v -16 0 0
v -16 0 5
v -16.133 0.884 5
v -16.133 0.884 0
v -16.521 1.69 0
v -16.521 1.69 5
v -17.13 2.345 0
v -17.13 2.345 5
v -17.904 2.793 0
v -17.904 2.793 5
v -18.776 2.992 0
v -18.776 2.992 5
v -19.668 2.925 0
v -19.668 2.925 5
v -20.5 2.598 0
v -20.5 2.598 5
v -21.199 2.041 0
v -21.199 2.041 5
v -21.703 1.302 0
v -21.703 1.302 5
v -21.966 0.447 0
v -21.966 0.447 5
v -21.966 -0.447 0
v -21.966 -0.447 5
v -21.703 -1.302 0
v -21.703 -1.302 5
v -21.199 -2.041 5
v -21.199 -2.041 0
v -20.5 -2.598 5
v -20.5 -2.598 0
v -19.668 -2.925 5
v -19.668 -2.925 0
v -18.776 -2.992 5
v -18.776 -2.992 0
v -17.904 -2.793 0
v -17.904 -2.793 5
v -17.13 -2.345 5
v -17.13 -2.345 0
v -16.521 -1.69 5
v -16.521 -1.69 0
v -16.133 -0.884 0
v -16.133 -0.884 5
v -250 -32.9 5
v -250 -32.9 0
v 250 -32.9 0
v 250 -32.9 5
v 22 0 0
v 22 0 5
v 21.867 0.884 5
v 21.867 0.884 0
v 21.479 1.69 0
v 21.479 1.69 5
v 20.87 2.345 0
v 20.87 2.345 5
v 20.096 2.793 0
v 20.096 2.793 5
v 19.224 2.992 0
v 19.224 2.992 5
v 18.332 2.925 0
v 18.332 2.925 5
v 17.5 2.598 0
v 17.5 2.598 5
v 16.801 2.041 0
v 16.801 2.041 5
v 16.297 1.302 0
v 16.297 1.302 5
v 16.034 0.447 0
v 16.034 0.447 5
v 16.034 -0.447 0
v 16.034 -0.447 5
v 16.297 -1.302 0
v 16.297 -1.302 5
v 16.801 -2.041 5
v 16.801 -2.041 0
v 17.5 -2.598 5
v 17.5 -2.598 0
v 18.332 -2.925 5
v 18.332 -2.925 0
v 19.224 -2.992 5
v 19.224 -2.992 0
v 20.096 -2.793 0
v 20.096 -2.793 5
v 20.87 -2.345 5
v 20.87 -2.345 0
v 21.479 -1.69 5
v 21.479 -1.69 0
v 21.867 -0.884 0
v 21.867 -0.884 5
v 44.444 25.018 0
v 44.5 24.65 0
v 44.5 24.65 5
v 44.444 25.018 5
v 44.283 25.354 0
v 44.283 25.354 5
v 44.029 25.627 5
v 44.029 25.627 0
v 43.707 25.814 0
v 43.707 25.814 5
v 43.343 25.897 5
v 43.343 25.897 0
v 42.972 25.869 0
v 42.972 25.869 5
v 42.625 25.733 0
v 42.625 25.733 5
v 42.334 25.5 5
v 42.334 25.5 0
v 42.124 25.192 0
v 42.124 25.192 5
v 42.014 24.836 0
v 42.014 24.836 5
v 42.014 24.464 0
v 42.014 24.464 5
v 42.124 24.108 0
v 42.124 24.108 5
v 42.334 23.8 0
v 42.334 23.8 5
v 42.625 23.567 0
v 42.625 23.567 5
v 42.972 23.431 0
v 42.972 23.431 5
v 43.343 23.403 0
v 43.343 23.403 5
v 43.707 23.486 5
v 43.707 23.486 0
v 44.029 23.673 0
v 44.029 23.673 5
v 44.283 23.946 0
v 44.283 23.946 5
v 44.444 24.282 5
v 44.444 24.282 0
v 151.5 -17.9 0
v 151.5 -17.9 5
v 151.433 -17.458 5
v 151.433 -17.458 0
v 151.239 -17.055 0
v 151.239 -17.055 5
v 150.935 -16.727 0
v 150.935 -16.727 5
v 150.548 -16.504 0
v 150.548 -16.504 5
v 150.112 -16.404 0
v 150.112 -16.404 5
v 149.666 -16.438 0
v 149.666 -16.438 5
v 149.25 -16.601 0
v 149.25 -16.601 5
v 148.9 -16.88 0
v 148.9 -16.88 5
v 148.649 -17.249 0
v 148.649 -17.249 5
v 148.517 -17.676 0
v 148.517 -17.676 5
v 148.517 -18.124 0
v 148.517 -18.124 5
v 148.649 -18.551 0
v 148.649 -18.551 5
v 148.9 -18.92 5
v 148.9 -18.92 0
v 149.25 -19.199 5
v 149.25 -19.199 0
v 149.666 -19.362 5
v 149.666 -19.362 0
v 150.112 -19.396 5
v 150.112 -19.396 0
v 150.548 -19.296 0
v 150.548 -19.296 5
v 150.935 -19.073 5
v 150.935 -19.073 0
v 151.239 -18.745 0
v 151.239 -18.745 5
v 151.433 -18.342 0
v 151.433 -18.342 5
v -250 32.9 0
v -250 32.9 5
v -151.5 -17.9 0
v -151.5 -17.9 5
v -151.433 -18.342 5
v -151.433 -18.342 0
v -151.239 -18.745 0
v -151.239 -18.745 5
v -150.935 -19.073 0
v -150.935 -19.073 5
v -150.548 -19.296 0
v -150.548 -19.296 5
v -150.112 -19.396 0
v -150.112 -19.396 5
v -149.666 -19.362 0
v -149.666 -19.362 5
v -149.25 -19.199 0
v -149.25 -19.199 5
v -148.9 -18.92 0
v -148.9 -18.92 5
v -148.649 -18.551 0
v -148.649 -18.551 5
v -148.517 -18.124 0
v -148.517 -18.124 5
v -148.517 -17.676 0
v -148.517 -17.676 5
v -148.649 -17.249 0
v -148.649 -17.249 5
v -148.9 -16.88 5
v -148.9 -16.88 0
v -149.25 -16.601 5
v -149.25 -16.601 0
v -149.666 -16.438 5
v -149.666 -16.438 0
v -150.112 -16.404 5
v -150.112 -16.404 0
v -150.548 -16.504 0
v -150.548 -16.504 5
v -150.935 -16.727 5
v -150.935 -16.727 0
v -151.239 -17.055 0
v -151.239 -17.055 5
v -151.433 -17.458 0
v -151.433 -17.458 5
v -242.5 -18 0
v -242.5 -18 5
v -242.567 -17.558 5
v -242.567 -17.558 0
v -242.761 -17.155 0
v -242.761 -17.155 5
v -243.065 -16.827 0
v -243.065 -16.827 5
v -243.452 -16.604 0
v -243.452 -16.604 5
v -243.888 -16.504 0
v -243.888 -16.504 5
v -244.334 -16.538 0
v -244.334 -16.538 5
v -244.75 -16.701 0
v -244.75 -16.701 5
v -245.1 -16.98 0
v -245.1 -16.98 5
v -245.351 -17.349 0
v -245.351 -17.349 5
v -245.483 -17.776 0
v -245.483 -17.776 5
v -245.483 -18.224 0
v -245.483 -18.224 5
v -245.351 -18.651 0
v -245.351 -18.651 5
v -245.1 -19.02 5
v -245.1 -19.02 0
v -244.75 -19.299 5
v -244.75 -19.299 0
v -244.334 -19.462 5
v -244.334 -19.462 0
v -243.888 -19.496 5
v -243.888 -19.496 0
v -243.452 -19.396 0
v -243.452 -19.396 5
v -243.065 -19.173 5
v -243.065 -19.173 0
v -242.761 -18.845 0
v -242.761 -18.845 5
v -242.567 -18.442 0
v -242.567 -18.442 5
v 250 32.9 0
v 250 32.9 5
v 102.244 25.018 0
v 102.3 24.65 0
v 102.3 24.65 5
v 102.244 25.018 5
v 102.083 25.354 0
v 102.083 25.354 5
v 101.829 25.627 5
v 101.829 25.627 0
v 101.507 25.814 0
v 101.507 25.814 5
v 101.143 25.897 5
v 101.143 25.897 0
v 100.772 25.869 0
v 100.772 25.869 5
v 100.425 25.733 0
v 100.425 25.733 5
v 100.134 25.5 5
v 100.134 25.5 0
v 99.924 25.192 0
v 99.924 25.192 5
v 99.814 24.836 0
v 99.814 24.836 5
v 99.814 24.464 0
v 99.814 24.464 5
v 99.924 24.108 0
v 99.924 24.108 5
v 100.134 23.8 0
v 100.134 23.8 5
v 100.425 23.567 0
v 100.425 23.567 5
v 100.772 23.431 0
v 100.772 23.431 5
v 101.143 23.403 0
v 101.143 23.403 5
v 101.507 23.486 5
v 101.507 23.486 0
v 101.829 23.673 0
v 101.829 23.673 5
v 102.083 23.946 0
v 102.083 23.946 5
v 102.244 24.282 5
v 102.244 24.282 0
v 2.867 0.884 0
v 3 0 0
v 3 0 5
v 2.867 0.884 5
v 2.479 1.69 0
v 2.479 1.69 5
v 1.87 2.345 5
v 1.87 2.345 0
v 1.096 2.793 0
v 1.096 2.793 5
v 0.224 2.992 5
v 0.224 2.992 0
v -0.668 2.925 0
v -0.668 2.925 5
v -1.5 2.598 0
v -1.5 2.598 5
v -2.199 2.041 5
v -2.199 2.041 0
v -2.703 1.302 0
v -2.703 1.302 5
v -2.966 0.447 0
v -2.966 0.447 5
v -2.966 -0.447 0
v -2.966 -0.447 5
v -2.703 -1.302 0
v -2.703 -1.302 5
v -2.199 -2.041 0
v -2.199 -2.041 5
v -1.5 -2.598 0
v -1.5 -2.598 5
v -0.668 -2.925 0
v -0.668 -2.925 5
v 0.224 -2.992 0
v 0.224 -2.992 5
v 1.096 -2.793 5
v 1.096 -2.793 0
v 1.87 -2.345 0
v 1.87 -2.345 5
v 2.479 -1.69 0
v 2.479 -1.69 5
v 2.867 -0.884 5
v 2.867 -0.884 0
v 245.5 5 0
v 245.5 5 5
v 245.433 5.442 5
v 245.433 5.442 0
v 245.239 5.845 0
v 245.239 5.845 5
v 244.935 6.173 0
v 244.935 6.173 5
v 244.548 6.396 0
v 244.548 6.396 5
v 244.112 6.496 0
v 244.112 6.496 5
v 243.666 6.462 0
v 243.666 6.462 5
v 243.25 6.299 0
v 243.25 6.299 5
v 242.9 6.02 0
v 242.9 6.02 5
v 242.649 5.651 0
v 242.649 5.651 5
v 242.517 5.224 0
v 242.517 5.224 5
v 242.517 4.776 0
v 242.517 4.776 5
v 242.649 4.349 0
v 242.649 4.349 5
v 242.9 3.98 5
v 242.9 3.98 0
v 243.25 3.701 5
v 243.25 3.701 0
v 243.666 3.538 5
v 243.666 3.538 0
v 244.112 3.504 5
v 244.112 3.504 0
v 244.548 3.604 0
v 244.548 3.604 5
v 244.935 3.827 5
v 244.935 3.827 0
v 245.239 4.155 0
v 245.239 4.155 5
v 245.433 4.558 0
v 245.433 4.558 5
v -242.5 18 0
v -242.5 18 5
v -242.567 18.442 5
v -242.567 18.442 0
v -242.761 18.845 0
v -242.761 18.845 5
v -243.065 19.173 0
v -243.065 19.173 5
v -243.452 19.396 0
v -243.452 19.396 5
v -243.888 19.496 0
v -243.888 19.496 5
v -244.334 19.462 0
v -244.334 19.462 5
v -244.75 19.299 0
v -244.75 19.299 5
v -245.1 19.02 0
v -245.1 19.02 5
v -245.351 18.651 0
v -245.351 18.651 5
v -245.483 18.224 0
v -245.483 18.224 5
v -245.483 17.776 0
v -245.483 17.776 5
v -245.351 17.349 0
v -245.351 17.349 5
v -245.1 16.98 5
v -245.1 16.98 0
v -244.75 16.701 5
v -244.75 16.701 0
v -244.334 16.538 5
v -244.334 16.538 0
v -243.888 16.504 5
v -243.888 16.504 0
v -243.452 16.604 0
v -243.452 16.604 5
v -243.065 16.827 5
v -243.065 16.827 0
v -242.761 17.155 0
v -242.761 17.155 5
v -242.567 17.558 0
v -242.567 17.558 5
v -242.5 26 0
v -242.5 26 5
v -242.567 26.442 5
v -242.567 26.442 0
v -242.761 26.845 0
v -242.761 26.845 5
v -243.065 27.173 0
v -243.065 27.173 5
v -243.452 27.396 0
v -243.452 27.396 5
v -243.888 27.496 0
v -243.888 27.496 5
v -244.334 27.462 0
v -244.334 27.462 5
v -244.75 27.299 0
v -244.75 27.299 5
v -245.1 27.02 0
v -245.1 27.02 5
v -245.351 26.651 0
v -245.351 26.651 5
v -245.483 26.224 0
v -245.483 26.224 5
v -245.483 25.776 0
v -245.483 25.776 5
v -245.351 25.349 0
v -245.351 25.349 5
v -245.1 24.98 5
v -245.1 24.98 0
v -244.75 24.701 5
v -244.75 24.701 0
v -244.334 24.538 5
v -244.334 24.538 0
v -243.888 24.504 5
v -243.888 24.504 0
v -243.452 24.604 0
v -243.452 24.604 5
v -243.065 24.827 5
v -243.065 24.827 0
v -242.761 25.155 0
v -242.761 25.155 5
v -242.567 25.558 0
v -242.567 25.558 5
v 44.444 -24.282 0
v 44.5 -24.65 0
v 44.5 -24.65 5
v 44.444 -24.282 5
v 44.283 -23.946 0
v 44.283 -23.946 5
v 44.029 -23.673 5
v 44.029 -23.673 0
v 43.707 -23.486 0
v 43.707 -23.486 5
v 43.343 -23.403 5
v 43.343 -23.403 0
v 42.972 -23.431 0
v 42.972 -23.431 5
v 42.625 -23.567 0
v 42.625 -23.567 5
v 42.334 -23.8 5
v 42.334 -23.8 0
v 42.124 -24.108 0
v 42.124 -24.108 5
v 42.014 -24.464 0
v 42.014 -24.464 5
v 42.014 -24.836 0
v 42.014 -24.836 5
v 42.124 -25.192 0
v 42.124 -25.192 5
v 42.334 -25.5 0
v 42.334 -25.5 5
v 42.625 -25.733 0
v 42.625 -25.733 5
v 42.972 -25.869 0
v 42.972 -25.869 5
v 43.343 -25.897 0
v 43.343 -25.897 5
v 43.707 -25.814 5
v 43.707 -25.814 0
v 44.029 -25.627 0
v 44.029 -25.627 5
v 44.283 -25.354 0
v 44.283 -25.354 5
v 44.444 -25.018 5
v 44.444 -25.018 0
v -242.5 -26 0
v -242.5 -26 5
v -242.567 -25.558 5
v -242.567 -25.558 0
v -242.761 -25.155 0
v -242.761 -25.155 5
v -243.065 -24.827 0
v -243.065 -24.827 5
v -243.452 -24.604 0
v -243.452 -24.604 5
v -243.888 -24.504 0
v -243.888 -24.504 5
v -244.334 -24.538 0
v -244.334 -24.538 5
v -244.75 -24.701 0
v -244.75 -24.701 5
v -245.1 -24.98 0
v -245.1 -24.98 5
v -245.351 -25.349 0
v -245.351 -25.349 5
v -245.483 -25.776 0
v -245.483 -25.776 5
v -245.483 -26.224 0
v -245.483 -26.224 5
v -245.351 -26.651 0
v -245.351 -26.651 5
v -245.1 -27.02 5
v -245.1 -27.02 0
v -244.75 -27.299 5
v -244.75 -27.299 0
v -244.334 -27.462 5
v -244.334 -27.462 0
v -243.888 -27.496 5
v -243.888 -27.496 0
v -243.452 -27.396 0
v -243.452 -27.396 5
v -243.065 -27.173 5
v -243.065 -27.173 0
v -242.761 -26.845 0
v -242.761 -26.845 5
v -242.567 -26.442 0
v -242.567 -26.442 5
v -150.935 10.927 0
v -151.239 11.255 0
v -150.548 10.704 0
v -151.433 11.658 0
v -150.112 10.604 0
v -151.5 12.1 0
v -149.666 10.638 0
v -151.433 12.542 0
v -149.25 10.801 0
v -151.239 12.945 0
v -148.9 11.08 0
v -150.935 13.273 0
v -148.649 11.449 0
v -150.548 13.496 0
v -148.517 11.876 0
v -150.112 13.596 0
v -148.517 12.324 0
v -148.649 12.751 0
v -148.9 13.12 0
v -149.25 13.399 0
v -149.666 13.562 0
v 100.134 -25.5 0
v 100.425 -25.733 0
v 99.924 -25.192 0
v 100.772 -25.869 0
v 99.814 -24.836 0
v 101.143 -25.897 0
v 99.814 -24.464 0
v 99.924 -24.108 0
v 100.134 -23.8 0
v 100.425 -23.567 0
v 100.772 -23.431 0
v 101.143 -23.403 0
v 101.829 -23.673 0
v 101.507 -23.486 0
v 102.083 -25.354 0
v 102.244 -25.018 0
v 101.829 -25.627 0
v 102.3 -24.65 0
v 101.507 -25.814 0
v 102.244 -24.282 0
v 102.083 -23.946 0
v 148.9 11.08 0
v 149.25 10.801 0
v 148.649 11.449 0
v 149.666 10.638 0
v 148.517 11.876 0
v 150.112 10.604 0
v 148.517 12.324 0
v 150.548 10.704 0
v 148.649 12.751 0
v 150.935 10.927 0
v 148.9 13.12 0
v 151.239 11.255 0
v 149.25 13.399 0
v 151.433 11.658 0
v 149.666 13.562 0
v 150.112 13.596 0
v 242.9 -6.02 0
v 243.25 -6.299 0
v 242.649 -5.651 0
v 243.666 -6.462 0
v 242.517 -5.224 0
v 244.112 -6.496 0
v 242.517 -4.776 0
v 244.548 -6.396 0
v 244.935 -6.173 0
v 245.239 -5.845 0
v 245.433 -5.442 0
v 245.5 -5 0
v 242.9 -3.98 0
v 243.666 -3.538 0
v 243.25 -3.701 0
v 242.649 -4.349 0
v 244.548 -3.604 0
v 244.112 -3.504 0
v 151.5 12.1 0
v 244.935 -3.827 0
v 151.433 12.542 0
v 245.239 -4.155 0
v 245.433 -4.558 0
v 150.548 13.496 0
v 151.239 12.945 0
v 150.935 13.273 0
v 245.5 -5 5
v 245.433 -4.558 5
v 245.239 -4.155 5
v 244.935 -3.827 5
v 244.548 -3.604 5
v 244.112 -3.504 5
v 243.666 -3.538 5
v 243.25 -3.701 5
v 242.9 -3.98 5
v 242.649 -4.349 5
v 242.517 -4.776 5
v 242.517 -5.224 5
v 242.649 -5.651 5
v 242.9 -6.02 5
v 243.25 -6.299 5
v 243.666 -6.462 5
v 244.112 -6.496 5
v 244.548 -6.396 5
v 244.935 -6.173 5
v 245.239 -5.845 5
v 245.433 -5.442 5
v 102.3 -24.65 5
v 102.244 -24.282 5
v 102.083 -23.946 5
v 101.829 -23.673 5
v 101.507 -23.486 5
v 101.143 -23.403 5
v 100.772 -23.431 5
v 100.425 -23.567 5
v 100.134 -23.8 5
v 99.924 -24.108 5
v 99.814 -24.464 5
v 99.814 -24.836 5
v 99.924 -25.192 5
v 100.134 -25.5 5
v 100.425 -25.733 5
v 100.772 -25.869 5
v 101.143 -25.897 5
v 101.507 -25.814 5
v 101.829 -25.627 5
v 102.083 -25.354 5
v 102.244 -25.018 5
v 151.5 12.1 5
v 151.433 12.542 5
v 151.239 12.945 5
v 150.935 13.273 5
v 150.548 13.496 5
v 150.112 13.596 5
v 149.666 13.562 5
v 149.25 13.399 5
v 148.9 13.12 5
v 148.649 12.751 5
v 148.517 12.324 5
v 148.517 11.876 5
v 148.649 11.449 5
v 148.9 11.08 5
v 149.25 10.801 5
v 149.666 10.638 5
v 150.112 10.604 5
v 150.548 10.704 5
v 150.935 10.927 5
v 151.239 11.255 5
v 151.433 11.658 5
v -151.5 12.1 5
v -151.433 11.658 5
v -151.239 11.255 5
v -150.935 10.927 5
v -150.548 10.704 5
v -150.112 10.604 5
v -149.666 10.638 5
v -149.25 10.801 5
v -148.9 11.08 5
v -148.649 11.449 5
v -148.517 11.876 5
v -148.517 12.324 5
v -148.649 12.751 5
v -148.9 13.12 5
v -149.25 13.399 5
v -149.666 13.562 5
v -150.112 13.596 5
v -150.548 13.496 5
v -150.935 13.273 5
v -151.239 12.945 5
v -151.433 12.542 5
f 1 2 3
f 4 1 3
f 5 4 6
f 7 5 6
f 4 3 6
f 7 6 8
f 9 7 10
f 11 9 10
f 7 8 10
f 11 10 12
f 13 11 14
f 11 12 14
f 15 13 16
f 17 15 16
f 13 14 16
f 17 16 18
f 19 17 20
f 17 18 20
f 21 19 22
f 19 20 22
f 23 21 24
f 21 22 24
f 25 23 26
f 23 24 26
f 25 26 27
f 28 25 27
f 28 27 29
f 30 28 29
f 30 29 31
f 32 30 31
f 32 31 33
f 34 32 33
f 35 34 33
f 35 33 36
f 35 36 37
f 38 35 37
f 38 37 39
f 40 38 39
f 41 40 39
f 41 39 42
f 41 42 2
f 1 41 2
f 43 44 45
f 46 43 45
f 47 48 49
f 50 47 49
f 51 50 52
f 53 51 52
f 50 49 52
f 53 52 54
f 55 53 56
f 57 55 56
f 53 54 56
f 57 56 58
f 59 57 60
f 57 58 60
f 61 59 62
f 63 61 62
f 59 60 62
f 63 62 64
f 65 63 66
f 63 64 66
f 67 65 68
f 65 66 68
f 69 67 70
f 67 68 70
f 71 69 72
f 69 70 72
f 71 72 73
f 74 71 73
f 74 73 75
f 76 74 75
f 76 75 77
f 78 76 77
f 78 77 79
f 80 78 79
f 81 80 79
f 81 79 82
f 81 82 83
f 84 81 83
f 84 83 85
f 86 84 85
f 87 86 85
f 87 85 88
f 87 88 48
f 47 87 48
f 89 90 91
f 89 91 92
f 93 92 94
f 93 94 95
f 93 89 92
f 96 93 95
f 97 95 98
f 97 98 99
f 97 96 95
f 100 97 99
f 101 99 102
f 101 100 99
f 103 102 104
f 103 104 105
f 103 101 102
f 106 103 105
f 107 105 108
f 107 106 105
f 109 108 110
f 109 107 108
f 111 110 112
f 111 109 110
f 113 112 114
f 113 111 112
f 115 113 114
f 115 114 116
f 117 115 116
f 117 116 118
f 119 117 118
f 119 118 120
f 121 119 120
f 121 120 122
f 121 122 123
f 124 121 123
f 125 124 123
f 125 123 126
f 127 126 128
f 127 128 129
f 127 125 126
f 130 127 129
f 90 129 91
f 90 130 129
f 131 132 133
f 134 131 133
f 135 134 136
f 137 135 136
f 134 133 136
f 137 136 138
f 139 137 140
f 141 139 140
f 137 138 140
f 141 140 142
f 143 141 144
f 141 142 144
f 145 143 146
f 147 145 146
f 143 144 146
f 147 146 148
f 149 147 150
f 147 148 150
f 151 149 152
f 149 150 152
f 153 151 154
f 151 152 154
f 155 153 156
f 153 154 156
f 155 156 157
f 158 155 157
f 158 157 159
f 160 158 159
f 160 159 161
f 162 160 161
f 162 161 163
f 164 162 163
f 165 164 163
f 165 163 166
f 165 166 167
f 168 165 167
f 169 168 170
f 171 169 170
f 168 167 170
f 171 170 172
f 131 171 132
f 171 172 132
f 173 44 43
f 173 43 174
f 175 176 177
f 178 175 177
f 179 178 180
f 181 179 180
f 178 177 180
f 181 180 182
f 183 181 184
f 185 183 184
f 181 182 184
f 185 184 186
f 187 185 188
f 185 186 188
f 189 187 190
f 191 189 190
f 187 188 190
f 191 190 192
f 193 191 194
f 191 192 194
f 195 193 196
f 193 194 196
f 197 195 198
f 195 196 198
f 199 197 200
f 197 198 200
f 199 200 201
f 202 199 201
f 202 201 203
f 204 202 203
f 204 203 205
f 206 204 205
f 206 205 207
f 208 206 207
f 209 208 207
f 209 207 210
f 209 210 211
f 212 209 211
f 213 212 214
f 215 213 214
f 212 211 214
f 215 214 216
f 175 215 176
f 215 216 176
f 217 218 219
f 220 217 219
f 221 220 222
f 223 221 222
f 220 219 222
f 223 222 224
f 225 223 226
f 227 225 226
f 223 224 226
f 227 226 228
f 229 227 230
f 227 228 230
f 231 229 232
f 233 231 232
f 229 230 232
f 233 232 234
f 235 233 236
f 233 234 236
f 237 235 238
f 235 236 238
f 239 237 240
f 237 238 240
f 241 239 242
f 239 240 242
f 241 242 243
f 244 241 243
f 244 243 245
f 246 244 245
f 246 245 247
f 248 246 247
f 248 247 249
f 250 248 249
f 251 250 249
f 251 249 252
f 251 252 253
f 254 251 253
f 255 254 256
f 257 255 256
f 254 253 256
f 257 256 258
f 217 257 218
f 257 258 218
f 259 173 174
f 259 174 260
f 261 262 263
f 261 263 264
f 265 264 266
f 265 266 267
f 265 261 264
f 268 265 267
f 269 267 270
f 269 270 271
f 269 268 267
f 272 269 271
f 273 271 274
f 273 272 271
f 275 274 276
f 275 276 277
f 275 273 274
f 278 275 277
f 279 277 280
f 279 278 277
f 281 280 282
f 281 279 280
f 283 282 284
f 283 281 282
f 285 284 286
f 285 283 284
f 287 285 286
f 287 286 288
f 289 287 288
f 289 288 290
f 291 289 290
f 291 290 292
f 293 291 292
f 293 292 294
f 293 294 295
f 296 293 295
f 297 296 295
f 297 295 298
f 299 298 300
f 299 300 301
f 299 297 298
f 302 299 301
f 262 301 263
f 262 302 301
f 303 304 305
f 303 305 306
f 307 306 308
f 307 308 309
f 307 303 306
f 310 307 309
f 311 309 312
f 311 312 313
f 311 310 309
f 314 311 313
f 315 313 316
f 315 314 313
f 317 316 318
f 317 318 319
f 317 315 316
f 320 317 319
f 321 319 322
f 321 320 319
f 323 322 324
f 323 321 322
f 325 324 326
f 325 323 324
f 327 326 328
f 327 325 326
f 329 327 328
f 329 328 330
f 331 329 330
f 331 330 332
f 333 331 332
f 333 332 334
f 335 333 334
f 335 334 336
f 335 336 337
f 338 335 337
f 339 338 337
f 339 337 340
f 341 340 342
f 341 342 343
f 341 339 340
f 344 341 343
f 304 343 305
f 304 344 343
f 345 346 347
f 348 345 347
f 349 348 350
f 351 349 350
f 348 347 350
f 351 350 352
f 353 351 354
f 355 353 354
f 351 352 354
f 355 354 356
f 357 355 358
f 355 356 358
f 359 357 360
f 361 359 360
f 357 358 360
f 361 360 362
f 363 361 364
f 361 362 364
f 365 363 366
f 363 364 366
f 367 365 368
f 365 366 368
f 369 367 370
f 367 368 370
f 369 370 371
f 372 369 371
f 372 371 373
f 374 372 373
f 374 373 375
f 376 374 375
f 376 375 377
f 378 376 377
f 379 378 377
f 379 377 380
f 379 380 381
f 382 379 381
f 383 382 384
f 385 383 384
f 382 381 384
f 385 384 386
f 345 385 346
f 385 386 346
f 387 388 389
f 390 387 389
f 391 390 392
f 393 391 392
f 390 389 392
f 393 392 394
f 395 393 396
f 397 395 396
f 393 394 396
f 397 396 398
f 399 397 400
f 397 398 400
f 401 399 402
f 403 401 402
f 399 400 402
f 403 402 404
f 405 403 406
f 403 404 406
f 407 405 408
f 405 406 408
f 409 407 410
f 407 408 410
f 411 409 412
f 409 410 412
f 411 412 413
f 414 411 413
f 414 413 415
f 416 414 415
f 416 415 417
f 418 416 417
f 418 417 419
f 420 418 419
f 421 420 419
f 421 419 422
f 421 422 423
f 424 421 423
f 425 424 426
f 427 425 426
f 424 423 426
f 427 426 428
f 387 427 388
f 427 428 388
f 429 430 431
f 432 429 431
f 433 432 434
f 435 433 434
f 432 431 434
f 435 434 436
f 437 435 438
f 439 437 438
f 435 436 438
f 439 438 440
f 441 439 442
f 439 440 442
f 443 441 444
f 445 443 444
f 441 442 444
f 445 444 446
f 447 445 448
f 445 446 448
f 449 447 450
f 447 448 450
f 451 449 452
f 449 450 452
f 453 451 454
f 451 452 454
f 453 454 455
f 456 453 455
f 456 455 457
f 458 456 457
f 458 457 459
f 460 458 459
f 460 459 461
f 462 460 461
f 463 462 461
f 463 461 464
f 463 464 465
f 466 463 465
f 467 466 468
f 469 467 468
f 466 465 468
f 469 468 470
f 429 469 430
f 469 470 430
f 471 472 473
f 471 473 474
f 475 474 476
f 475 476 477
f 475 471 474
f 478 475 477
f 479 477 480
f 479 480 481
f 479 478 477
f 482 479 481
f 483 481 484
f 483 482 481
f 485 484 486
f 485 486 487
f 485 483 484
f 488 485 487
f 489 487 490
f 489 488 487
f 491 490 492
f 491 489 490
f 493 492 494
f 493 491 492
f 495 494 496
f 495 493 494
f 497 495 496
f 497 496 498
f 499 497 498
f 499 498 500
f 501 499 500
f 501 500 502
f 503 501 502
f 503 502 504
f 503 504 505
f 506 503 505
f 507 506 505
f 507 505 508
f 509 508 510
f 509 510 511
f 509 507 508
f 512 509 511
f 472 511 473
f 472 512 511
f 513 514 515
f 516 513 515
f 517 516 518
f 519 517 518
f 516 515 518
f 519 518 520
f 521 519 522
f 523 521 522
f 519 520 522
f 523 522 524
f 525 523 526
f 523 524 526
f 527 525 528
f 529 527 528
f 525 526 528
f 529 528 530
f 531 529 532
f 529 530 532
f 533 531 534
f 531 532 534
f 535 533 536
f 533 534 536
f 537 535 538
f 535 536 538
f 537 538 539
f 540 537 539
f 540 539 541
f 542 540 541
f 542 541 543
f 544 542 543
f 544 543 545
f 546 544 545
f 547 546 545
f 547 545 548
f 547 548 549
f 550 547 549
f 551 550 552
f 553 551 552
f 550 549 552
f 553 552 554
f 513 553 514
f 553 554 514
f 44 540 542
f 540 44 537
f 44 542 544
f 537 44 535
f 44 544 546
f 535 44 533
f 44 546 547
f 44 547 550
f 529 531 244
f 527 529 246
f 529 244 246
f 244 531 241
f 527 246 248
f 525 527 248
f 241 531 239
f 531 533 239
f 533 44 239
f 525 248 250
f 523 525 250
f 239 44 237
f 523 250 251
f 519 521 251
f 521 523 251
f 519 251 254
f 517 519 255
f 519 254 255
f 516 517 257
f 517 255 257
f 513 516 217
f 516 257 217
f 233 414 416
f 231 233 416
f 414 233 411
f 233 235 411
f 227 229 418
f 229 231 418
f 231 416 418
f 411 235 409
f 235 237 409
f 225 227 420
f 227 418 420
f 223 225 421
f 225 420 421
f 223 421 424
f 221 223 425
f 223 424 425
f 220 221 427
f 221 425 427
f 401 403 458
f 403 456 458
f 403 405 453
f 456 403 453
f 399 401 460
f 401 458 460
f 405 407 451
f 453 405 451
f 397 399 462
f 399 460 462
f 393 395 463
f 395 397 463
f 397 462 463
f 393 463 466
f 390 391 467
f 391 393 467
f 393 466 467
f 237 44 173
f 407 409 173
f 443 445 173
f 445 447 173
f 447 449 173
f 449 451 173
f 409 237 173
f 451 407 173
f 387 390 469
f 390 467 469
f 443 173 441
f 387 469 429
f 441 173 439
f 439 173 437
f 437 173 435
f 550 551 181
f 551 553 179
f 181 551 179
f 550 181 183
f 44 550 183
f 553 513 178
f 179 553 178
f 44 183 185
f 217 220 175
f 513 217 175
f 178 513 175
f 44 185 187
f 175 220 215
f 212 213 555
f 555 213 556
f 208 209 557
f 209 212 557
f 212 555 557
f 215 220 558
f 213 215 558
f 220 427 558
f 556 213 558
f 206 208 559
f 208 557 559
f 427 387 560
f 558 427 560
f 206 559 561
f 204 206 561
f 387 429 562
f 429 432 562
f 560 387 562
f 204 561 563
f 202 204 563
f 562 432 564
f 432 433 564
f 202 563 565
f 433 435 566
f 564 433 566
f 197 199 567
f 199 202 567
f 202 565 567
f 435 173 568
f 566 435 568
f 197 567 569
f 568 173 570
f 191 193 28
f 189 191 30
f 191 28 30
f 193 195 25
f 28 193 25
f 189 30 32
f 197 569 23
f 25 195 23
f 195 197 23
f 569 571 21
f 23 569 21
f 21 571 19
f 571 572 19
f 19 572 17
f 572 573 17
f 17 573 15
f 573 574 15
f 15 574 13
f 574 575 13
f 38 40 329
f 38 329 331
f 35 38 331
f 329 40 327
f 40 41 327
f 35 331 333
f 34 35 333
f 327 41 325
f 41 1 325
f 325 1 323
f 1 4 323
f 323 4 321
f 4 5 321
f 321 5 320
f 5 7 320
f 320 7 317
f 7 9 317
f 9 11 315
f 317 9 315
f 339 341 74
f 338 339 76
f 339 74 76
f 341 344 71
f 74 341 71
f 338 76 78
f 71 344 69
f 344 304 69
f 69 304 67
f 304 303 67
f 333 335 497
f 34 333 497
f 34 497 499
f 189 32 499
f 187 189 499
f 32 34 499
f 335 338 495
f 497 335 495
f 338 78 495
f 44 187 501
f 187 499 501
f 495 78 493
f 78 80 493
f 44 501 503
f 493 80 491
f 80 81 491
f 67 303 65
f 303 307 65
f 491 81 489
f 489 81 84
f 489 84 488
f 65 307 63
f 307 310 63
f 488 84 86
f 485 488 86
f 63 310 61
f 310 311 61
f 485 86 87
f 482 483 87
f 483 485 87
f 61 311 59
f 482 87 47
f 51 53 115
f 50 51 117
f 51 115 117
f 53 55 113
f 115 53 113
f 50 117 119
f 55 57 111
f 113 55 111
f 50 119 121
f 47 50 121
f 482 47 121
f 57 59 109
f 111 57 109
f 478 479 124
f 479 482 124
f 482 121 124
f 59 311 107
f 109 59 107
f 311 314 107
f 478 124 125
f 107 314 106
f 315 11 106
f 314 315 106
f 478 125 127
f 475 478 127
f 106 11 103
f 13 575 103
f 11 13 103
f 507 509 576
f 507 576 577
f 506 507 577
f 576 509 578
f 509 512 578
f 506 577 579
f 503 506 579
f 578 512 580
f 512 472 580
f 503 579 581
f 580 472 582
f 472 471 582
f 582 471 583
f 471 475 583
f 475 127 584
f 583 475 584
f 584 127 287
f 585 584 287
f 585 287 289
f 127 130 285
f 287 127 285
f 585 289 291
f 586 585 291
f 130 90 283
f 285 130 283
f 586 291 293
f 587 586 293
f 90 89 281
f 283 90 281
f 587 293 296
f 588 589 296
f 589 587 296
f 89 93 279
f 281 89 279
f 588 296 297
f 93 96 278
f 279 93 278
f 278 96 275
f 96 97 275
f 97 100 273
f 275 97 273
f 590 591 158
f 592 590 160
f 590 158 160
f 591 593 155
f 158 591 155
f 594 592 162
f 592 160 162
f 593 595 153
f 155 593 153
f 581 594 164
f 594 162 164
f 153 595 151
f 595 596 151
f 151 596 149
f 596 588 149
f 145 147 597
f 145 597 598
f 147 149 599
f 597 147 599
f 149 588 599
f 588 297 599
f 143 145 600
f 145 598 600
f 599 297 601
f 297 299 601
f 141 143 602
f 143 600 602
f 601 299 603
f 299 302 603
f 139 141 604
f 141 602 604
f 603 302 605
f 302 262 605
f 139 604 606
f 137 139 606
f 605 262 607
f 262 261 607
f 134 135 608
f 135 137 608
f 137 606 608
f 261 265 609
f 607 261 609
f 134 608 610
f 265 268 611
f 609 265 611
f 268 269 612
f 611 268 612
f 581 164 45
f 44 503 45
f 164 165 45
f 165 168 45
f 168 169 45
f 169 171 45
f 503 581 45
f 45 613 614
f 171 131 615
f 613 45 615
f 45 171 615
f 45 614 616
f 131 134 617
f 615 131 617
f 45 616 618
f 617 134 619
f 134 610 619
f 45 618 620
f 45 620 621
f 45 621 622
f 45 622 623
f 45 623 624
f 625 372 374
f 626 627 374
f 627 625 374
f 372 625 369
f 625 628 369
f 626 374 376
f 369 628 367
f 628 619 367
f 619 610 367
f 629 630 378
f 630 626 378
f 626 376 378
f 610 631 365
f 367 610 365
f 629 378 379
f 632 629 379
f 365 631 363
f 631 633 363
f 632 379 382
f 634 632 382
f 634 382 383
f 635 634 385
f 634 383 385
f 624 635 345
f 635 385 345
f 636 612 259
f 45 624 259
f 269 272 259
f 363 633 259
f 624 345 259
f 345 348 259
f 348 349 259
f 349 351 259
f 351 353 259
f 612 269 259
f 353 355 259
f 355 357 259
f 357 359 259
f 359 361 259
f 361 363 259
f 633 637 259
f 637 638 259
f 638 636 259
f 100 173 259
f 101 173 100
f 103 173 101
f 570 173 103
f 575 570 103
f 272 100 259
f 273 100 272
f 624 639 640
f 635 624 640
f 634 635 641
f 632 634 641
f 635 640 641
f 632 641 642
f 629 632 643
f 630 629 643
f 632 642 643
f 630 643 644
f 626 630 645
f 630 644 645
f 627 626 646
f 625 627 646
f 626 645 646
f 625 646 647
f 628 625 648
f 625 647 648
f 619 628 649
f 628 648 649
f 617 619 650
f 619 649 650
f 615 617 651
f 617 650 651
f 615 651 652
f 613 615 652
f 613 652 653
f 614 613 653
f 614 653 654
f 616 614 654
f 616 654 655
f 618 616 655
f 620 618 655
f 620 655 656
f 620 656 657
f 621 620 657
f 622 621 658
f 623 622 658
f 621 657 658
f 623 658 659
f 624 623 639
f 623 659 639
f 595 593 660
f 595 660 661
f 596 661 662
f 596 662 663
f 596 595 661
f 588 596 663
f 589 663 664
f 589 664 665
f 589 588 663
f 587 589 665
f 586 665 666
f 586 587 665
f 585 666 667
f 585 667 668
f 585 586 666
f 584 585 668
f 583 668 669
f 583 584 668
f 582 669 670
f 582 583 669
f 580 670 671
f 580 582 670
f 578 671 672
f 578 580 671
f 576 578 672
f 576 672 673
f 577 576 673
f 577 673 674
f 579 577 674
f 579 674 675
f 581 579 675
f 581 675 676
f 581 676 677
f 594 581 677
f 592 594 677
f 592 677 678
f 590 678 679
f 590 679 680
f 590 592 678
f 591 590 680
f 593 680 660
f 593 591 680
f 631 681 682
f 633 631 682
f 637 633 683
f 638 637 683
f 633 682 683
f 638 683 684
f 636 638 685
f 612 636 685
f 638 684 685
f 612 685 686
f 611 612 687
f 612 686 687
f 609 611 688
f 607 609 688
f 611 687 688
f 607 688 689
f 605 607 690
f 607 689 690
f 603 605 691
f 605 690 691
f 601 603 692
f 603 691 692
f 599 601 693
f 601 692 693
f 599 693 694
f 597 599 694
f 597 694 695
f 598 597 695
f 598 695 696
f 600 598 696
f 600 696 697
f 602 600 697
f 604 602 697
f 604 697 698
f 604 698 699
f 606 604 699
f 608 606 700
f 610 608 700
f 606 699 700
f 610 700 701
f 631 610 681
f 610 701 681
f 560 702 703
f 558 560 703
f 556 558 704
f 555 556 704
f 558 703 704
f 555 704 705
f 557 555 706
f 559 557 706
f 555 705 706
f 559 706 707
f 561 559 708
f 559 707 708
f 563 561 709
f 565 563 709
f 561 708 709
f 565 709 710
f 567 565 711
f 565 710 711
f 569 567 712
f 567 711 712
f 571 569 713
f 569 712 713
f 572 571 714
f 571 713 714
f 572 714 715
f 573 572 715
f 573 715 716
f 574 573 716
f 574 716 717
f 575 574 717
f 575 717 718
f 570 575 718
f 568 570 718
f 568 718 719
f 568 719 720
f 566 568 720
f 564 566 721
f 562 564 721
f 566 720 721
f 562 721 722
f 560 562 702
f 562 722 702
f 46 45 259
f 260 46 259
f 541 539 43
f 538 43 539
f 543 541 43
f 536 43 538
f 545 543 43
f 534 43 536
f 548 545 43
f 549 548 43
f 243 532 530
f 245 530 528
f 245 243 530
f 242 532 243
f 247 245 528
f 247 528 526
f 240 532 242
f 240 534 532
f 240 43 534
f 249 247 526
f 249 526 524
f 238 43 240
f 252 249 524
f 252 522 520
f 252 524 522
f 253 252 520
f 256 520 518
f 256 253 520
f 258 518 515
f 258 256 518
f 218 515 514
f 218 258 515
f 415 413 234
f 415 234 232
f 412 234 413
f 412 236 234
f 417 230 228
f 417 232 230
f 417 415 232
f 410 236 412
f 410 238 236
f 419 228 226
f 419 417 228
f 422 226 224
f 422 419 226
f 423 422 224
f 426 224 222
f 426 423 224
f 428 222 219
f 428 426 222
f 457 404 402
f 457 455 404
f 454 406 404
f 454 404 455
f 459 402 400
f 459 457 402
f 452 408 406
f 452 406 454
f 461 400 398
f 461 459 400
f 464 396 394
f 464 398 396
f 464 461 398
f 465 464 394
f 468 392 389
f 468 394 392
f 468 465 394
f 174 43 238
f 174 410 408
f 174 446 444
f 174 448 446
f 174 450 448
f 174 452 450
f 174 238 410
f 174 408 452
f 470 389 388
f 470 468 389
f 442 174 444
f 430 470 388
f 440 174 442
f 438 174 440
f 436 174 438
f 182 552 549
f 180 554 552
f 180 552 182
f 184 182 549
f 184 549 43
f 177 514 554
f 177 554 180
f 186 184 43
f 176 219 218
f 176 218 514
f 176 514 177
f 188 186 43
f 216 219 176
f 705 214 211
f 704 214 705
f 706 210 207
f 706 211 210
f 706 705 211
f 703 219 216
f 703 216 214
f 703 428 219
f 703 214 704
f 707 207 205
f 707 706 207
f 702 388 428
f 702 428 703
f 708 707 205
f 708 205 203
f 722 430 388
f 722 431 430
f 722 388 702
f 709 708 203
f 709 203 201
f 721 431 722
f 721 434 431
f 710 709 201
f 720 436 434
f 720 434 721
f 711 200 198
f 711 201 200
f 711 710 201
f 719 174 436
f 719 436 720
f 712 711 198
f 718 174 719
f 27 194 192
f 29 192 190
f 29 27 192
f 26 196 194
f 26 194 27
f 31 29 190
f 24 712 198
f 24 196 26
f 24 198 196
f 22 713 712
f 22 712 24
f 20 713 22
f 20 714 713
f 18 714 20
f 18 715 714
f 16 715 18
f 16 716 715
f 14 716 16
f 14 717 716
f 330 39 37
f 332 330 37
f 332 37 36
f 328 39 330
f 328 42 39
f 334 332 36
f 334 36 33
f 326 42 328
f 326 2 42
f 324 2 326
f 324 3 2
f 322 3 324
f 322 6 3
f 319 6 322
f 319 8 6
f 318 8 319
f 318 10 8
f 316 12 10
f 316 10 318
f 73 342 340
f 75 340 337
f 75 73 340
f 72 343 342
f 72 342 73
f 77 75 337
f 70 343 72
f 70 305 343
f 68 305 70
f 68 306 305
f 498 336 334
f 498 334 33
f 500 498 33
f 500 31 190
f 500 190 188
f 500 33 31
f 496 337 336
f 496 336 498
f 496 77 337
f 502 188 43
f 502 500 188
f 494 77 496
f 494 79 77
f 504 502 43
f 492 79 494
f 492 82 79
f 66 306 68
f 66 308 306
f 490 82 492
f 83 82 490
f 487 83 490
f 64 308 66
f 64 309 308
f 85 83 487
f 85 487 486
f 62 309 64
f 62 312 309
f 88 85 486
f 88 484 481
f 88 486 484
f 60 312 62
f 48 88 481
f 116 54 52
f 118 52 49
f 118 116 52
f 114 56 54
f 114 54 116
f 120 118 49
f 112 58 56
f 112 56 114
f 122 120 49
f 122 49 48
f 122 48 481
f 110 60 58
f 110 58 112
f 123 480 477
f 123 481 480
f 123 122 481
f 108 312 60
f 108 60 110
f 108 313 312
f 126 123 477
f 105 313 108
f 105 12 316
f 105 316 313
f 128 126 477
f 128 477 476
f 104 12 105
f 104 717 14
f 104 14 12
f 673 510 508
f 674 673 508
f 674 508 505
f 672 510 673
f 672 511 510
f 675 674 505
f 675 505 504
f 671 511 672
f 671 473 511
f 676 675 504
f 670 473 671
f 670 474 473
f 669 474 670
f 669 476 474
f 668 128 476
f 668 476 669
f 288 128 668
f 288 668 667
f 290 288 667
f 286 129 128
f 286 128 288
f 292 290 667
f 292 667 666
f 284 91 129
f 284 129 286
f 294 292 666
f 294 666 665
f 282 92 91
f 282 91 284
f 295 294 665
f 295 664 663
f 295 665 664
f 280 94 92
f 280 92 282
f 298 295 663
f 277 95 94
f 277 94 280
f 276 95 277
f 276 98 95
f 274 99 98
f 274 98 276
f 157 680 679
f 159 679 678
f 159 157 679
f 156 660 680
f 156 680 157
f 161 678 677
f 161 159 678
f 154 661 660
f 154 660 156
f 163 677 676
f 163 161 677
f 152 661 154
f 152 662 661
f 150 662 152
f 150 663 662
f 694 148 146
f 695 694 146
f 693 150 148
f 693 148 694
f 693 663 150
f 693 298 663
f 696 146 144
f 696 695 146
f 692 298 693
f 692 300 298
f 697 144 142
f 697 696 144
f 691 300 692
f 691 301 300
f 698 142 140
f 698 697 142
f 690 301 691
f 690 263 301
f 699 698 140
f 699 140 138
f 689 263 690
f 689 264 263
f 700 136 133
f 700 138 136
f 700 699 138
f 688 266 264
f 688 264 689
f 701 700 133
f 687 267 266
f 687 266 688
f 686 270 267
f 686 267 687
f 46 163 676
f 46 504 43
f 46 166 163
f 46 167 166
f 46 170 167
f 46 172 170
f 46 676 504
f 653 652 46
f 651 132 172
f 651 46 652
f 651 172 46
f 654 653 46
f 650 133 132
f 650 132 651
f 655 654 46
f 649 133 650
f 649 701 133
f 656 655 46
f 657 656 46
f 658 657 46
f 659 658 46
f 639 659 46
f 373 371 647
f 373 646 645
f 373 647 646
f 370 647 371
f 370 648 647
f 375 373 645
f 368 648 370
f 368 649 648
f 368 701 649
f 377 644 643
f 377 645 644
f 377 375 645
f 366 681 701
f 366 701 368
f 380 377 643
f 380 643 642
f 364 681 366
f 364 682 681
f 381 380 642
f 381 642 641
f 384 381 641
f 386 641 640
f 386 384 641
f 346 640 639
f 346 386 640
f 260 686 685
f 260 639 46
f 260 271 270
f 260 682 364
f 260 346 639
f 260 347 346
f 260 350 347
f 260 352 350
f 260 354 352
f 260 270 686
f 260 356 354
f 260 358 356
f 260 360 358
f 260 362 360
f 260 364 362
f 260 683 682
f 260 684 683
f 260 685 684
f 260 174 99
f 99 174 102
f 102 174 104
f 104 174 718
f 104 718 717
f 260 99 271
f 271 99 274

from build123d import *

# Parameters (mm, degrees)
SKETCH_3_W          = 500
SKETCH_3_H          = 65.8
SKETCH_3_R          = 1.25
SKETCH_3_R_2        = 3
EXTRUDE_2_DEPTH     = 5
SKETCH_4_R          = 1.5
CUT_EXTRUDE_1_DEPTH = 5
SKETCH_5_R          = 1.5
CUT_EXTRUDE_2_DEPTH = 5
SKETCH_6_R          = 3
CUT_EXTRUDE_3_DEPTH = 10


with BuildPart() as part:
    # 草图3 → 凸台-拉伸2 (new body)
    with BuildSketch(Plane.XY):
        Rectangle(SKETCH_3_W, SKETCH_3_H)
        with Locations((43.25, 24.65)):
            Circle(SKETCH_3_R, mode=Mode.SUBTRACT)
        with Locations((43.25, -24.65)):
            Circle(SKETCH_3_R, mode=Mode.SUBTRACT)
        with Locations((101.05, -24.65)):
            Circle(SKETCH_3_R, mode=Mode.SUBTRACT)
        with Locations((101.05, 24.65)):
            Circle(SKETCH_3_R, mode=Mode.SUBTRACT)
        Circle(SKETCH_3_R_2, mode=Mode.SUBTRACT)
    extrude(amount=EXTRUDE_2_DEPTH)

    # 草图4 → 切除-拉伸1 (cut)
    with BuildSketch(Plane.XY.offset(5)):
        with Locations((150, 12.1)):
            Circle(SKETCH_4_R)
        with Locations((150, -17.9)):
            Circle(SKETCH_4_R)
        with Locations(Location((-150, -17.9, 0), (0, 0, 180))):
            Circle(SKETCH_4_R)
        with Locations(Location((-150, 12.1, 0), (0, 0, 180))):
            Circle(SKETCH_4_R)
    extrude(amount=-CUT_EXTRUDE_1_DEPTH, mode=Mode.SUBTRACT)

    # 草图5 → 切除-拉伸2 (cut)
    with BuildSketch(Plane.XY.offset(5)):
        with Locations((-244, 26)):
            Circle(SKETCH_5_R)
        with Locations((244, -5)):
            Circle(SKETCH_5_R)
        with Locations((244, 5)):
            Circle(SKETCH_5_R)
        with Locations((-244, 18)):
            Circle(SKETCH_5_R)
        with Locations((-244, -18)):
            Circle(SKETCH_5_R)
        with Locations((-244, -26)):
            Circle(SKETCH_5_R)
    extrude(amount=-CUT_EXTRUDE_2_DEPTH, mode=Mode.SUBTRACT)

    # 草图6 → 切除-拉伸3 (cut)
    with BuildSketch(Plane.XY.offset(5)):
        with Locations((19, 0)):
            Circle(SKETCH_6_R)
        with Locations((-19, 0)):
            Circle(SKETCH_6_R)
    extrude(amount=-CUT_EXTRUDE_3_DEPTH, mode=Mode.SUBTRACT)


solid = part.part
